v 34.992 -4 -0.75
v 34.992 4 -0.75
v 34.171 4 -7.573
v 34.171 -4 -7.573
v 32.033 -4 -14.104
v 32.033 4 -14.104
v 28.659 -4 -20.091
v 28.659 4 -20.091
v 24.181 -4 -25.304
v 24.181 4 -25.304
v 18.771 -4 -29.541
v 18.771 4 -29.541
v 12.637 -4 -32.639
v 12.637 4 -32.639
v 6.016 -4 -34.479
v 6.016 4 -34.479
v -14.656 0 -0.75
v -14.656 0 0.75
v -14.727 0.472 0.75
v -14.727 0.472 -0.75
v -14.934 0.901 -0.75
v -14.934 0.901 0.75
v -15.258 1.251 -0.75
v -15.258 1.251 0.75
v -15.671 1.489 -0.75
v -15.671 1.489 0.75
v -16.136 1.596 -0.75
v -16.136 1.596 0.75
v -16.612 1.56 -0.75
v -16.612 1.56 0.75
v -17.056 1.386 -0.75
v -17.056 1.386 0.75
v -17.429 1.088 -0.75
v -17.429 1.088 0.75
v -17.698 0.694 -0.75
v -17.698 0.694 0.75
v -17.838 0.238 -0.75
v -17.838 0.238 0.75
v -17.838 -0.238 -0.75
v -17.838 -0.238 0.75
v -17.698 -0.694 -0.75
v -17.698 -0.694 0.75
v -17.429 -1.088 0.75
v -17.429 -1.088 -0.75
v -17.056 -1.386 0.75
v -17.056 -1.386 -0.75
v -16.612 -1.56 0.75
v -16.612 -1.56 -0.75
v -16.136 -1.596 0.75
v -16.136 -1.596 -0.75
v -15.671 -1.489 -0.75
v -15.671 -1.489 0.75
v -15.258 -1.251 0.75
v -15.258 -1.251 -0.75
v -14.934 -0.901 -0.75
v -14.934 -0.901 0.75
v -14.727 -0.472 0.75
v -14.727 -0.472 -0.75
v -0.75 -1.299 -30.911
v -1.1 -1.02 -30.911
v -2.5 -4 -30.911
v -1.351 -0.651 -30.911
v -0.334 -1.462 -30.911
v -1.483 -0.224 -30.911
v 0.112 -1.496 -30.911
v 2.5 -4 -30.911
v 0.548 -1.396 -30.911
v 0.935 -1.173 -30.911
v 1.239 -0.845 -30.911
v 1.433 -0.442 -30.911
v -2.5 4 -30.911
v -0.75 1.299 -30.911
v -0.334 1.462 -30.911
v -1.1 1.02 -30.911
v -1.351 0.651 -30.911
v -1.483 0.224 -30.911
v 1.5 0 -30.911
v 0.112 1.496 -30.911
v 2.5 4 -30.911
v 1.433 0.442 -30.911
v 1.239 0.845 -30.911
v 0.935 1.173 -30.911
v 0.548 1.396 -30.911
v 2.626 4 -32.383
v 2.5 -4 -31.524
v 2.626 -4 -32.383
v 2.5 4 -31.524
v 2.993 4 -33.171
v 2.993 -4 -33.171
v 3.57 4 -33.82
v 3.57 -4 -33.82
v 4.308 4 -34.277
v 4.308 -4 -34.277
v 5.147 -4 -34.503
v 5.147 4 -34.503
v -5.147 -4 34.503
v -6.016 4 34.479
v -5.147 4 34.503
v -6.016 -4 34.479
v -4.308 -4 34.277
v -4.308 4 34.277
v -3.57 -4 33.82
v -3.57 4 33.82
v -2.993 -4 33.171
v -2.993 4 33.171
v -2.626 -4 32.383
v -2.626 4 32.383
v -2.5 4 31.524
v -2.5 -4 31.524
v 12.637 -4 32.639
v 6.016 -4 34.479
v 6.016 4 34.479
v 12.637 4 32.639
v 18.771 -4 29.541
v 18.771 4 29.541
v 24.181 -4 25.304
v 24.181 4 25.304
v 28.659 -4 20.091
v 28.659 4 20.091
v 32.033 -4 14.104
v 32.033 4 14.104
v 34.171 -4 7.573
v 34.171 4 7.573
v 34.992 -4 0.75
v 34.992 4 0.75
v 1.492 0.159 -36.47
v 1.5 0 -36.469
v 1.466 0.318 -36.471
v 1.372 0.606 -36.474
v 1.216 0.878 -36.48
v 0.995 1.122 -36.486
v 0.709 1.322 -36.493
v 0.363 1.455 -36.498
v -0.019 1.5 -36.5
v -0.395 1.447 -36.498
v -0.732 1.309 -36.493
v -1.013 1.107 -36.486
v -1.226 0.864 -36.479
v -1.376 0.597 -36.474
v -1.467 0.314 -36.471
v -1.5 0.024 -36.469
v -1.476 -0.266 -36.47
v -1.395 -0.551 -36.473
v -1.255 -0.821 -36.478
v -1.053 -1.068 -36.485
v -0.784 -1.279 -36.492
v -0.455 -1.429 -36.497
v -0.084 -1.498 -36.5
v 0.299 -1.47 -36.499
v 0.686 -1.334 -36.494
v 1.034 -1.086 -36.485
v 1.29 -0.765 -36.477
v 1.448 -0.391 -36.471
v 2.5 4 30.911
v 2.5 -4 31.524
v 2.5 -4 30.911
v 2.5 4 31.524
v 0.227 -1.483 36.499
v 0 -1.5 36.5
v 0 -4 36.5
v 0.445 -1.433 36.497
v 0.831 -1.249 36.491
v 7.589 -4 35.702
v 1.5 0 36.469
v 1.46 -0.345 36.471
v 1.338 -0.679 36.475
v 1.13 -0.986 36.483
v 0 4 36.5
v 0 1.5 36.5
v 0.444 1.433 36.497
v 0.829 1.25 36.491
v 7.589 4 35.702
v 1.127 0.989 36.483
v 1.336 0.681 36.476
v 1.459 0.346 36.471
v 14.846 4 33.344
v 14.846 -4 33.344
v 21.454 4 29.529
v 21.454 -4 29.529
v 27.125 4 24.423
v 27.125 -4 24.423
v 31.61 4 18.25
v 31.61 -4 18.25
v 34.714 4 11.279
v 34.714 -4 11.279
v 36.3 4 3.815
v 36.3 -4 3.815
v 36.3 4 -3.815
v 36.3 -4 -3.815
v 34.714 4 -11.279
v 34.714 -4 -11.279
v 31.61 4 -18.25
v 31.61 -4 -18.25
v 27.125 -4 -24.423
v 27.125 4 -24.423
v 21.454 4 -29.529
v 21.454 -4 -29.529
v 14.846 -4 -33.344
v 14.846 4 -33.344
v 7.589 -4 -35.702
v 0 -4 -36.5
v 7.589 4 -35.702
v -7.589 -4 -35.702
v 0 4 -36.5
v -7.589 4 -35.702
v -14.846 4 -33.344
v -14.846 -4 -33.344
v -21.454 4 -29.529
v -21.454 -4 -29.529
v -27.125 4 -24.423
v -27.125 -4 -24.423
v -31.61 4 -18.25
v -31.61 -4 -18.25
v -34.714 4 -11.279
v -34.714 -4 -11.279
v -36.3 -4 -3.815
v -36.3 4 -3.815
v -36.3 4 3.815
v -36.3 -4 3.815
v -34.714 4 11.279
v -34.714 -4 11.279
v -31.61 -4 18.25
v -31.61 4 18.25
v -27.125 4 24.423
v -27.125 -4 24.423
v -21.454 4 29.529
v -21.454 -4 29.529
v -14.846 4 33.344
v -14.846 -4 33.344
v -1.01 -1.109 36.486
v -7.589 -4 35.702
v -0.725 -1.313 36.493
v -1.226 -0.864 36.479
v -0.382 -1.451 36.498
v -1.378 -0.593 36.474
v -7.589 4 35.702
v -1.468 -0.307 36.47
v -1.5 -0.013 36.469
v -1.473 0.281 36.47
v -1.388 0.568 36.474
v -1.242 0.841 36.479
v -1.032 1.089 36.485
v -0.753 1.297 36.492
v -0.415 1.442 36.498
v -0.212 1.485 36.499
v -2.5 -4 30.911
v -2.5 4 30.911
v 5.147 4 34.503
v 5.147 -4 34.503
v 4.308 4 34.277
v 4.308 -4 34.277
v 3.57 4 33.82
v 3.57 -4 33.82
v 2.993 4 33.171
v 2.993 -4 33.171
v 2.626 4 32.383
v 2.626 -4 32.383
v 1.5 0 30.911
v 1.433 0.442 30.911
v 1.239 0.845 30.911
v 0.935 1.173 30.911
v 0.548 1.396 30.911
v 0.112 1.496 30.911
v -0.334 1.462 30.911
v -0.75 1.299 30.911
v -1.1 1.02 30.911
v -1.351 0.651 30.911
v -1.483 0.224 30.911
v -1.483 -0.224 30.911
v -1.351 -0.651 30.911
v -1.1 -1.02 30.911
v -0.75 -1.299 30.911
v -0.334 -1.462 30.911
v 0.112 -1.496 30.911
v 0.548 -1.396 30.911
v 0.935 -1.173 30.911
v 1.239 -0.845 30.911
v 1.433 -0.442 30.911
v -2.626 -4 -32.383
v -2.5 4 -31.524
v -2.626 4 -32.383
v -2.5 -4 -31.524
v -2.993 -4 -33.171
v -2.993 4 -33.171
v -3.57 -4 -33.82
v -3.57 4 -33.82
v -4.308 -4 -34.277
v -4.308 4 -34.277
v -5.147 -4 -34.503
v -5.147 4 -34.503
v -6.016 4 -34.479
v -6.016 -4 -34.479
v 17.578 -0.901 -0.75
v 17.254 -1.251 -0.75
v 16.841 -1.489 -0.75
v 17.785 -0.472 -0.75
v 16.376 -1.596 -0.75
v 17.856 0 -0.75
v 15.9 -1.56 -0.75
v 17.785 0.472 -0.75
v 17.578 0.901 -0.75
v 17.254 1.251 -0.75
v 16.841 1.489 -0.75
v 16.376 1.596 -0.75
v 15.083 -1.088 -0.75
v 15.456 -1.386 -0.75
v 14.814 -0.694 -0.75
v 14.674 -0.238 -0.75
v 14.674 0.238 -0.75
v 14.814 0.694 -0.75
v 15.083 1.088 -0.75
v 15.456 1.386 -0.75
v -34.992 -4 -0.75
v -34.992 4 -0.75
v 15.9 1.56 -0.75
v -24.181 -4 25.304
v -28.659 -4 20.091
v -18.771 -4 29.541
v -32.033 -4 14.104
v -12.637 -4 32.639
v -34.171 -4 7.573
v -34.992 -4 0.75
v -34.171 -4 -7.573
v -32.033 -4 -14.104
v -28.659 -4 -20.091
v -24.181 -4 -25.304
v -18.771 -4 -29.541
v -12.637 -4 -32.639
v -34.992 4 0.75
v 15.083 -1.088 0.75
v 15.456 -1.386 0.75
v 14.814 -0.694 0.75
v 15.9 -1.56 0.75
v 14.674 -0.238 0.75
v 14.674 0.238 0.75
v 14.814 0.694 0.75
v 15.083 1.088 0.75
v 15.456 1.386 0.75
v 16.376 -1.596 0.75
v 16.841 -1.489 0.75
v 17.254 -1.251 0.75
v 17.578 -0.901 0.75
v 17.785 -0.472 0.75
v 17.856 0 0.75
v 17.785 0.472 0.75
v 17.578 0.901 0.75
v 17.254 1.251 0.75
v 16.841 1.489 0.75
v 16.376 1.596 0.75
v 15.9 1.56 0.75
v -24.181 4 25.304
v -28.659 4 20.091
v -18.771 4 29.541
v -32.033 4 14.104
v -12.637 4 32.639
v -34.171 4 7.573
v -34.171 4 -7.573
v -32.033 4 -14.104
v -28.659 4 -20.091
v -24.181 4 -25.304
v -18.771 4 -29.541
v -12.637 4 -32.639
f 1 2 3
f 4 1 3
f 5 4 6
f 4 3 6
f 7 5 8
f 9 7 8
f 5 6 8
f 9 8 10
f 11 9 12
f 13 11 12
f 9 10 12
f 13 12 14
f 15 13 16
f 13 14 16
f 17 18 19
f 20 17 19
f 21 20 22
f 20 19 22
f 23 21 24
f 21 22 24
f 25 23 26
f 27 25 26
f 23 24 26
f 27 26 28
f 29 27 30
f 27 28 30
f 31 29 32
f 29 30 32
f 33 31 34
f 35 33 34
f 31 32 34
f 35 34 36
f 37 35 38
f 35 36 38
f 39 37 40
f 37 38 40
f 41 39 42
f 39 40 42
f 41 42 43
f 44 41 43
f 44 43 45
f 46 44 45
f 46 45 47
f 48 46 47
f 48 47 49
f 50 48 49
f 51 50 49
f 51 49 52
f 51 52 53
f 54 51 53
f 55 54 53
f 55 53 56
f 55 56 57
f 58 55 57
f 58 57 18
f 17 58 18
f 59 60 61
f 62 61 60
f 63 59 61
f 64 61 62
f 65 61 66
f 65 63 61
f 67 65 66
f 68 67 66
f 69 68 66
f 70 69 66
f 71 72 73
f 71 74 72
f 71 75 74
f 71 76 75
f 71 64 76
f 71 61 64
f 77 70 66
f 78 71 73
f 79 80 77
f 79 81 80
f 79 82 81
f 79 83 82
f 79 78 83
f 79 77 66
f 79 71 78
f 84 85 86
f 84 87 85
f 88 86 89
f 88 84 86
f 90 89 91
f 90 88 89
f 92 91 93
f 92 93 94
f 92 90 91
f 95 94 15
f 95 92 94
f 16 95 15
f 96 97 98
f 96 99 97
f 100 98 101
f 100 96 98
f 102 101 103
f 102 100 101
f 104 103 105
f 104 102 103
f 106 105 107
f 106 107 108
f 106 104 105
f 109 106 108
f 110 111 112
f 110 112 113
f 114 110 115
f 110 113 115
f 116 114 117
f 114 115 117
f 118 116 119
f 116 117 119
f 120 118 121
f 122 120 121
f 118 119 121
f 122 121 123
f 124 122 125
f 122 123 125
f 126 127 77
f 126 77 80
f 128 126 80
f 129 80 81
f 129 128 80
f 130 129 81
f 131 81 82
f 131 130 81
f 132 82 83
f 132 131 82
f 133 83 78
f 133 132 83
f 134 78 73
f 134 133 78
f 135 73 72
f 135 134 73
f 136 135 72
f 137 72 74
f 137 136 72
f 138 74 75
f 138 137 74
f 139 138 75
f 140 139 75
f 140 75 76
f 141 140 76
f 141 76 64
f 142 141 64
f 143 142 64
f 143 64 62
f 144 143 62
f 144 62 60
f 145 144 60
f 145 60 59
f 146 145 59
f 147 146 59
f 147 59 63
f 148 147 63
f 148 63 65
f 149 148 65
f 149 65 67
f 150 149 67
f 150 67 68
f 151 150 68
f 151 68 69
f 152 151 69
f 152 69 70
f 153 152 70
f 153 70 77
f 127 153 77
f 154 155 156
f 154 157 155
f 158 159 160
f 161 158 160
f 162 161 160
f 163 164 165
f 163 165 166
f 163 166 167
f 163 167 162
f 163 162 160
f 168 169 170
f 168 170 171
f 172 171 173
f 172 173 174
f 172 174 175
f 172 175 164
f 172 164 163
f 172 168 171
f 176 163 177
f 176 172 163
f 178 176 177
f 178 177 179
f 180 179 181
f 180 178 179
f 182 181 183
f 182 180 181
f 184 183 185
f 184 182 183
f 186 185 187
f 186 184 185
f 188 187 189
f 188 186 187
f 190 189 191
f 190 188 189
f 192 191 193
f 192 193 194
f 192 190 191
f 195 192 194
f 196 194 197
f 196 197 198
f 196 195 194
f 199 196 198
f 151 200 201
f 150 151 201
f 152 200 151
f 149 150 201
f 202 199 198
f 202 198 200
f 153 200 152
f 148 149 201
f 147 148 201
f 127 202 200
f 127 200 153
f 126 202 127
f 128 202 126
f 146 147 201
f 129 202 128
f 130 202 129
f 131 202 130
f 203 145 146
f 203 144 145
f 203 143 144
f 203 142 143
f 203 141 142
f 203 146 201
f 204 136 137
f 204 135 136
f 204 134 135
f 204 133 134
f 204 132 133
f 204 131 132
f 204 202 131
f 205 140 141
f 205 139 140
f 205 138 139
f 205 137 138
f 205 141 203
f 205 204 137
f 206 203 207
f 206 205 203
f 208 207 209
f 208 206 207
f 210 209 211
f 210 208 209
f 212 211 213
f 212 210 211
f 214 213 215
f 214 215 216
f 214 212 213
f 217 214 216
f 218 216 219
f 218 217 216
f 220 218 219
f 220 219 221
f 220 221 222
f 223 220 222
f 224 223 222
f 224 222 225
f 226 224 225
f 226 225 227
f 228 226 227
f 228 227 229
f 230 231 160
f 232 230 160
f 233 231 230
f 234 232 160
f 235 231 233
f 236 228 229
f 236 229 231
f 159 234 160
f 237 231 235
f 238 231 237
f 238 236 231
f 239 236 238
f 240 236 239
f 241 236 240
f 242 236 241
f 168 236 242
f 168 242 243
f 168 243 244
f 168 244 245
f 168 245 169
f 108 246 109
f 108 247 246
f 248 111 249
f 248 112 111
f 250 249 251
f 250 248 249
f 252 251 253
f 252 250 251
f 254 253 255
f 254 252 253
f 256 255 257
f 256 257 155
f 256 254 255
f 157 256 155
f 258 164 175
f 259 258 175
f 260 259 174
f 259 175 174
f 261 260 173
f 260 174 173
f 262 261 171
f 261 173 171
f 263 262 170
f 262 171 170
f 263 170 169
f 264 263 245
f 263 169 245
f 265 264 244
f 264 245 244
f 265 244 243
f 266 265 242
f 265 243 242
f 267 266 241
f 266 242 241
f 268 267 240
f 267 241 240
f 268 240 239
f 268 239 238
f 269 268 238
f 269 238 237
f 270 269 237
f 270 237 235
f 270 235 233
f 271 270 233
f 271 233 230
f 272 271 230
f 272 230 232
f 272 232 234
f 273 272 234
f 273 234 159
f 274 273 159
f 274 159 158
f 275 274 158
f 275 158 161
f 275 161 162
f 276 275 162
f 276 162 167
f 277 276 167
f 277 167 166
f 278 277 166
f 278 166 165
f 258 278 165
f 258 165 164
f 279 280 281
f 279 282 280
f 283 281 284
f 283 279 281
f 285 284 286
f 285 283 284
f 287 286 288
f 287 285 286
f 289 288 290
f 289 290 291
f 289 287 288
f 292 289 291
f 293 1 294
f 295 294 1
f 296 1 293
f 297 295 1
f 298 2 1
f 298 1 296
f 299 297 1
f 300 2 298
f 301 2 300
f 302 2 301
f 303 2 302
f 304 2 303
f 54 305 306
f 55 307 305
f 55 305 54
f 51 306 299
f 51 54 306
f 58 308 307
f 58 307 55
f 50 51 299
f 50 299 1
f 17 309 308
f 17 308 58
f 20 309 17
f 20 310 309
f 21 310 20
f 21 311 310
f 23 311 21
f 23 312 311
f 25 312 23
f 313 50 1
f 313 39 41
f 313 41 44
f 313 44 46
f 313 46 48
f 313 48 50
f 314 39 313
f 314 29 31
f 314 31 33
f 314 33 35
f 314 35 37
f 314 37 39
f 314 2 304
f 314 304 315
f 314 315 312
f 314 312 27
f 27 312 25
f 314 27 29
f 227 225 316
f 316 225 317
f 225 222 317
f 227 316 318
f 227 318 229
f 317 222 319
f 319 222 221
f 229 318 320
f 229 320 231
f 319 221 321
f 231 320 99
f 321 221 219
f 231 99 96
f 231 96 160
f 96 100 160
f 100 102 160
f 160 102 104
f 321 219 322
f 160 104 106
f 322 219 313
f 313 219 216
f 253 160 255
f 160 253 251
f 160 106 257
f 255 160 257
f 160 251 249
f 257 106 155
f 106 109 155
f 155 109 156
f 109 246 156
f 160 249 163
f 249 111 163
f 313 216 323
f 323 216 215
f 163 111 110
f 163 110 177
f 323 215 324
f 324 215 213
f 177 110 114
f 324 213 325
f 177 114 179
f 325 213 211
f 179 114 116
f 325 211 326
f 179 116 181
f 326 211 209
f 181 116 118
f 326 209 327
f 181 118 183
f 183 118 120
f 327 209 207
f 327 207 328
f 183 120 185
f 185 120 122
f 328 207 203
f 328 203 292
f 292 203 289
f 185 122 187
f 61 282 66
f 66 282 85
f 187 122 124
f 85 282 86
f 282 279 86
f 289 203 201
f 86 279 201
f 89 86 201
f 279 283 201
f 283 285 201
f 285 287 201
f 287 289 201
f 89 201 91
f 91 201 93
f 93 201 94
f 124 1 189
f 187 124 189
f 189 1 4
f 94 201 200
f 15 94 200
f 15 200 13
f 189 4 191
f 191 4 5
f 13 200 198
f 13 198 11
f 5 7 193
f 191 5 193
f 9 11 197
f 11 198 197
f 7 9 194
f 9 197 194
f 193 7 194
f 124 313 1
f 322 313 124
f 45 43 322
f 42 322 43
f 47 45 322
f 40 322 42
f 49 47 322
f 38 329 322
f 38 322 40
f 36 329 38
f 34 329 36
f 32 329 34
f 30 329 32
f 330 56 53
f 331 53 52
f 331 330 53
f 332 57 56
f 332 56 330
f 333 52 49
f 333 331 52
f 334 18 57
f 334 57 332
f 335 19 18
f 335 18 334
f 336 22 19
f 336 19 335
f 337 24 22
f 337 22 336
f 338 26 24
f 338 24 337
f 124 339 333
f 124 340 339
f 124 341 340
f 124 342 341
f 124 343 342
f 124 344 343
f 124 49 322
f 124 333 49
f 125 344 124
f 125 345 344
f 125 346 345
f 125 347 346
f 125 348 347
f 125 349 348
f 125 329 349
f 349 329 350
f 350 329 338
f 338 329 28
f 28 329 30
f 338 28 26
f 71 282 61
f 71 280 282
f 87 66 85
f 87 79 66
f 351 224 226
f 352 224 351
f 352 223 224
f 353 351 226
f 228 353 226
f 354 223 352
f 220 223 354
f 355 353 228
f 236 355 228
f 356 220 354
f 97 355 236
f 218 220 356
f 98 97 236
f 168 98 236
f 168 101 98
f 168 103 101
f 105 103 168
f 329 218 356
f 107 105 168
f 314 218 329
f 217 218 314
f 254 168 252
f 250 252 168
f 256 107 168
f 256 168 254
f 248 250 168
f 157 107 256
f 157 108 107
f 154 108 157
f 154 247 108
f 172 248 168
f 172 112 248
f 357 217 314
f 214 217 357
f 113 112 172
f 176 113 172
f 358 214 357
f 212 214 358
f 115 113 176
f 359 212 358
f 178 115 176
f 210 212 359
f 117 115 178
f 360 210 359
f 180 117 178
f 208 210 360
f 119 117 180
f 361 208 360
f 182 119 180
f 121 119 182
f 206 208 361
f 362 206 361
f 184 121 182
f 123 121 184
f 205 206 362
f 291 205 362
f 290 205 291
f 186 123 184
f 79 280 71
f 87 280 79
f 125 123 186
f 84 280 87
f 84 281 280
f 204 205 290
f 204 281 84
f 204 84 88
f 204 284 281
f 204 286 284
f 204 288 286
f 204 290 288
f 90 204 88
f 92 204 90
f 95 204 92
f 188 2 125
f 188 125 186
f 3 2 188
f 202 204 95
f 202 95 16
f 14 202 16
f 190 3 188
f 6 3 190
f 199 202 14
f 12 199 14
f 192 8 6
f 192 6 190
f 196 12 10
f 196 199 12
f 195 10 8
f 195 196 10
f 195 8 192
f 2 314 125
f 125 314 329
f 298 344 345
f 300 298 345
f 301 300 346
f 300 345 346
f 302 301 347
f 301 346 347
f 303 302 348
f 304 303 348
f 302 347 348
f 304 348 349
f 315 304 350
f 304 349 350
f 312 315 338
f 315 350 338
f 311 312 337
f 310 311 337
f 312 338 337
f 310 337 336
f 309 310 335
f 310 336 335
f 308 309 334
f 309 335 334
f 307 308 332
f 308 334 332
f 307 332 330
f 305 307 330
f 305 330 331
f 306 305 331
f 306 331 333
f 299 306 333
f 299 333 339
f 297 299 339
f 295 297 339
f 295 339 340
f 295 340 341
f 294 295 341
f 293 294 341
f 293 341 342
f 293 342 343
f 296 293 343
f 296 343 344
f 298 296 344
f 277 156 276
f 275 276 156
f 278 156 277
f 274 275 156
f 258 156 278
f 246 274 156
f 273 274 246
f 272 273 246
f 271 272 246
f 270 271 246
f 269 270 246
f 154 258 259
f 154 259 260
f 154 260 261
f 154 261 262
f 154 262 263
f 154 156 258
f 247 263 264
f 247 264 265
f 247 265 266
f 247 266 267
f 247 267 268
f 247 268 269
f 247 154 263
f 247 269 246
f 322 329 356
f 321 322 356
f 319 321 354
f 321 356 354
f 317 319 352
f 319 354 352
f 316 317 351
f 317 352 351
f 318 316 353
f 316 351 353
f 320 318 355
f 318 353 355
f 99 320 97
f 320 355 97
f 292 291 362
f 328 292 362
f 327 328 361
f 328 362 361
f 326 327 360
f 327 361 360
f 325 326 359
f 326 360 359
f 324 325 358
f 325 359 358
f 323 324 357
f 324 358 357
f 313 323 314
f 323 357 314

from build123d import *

# Parameters (mm, degrees)
ESQUISSE1_R             = 36.5
ESQUISSE1_R_2           = 35
BOSS_EXTRU_1_DEPTH      = 4
ENL_V_MAT_EXTRU_1_REACH = 83.714
ESQUISSE3_R             = 1.5
ENL_V_MAT_EXTRU_2_REACH = 54.305
ESQUISSE2_R             = 1.6
CONG_1_R                = 3


with BuildPart() as part:
    # Esquisse1 → Boss.-Extru.1 (new, symmetric)
    # profile 1 of 7: a face of its own
    with BuildSketch(Plane(origin=(0, 0, 0), x_dir=(1, 0, 0), z_dir=(0, 1, 0))):
        with Locations(Location((0, 0, 0), (0, 0, 270))):
            Circle(ESQUISSE1_R)
        Circle(ESQUISSE1_R_2, mode=Mode.SUBTRACT)
    # profile 2 of 7: a face of its own
    with BuildSketch(Plane(origin=(0, 0, 0), x_dir=(1, 0, 0), z_dir=(0, 1, 0))):
        with BuildLine():
            Line((34.991963363, 0.75), (0, 0.75))
            Line((0, 0.75), (0, -0.75))
            Line((0, -0.75), (34.991963363, -0.75))
            ThreePointArc((34.991963363, -0.75), (34.997990783, -0.375021529), (35, 0))
            ThreePointArc((35, 0), (34.997990783, 0.375021529), (34.991963363, 0.75))
        make_face()
    # profile 3 of 7: a face of its own
    with BuildSketch(Plane(origin=(0, 0, 0), x_dir=(1, 0, 0), z_dir=(0, 1, 0))):
        with BuildLine():
            Line((0, 0.75), (-34.991963363, 0.75))
            ThreePointArc((-34.991963363, 0.75), (-35, 0), (-34.991963363, -0.75))
            Line((-34.991963363, -0.75), (0, -0.75))
            Line((0, -0.75), (0, 0.75))
        make_face()
    # profile 4 of 7: a face of its own
    with BuildSketch(Plane(origin=(0, 0, 0), x_dir=(1, 0, 0), z_dir=(0, 1, 0))):
        with BuildLine():
            Line((0, 0.75), (-34.991963363, 0.75))
            ThreePointArc((-34.991963363, 0.75), (-35, 0), (-34.991963363, -0.75))
            Line((-34.991963363, -0.75), (0, -0.75))
            Line((0, -0.75), (0, 0.75))
        make_face()
    # profile 5 of 7: a face of its own
    with BuildSketch(Plane(origin=(0, 0, 0), x_dir=(1, 0, 0), z_dir=(0, 1, 0))):
        with BuildLine():
            Line((34.991963363, 0.75), (0, 0.75))
            Line((0, 0.75), (0, -0.75))
            Line((0, -0.75), (34.991963363, -0.75))
            ThreePointArc((34.991963363, -0.75), (34.997990783, -0.375021529), (35, 0))
            ThreePointArc((35, 0), (34.997990783, 0.375021529), (34.991963363, 0.75))
        make_face()
    # profile 6 of 7: a face of its own
    with BuildSketch(Plane(origin=(0, 0, 0), x_dir=(1, 0, 0), z_dir=(0, 1, 0))):
        with BuildLine():
            Line((-2.5, -30.910600109), (-2.5, -34.910600109))
            ThreePointArc((-2.5, -34.910600109), (0, -35), (2.5, -34.910600109))
            Line((2.5, -34.910600109), (2.5, -30.910600109))
            Line((2.5, -30.910600109), (-2.5, -30.910600109))
        make_face()
    # profile 7 of 7: a face of its own
    with BuildSketch(Plane(origin=(0, 0, 0), x_dir=(1, 0, 0), z_dir=(0, 1, 0))):
        with BuildLine():
            ThreePointArc((2.5, 34.910600109), (0, 35), (-2.5, 34.910600109))
            Line((-2.5, 34.910600109), (-2.5, 30.910600109))
            Line((-2.5, 30.910600109), (2.5, 30.910600109))
            Line((2.5, 30.910600109), (2.5, 34.910600109))
        make_face()
    extrude(amount=BOSS_EXTRU_1_DEPTH, both=True)

    # Esquisse3 → Enlèv. mat.-Extru.1 (cut, up to next)
    with BuildSketch(Plane.XY.offset(36.5), mode=Mode.PRIVATE) as enl_v_mat_extru_1_sk1:
        Circle(ESQUISSE3_R)
    enl_v_mat_extru_1_tool1 = extrude(enl_v_mat_extru_1_sk1.sketch, amount=-ENL_V_MAT_EXTRU_1_REACH, mode=Mode.PRIVATE) & part.part
    enl_v_mat_extru_1 = enl_v_mat_extru_1_tool1.solids().sort_by_distance((0, 0, 36.5))[0]
    add(enl_v_mat_extru_1, mode=Mode.SUBTRACT)

    # Symétrie1: Enlèv. mat.-Extru.1 across plane
    add(enl_v_mat_extru_1.mirror(Plane.XY), mode=Mode.SUBTRACT)

    # Esquisse2 → Enlèv. mat.-Extru.2 (cut, up to next)
    with BuildSketch(Plane.XY.offset(0.75), mode=Mode.PRIVATE) as enl_v_mat_extru_2_sk1:
        with Locations((-16.256, 0)):
            Circle(ESQUISSE2_R)
    enl_v_mat_extru_2_tool1 = extrude(enl_v_mat_extru_2_sk1.sketch, amount=-ENL_V_MAT_EXTRU_2_REACH, mode=Mode.PRIVATE) & part.part
    # Esquisse2 → Enlèv. mat.-Extru.2 (cut, up to next)
    with BuildSketch(Plane.XY.offset(0.75), mode=Mode.PRIVATE) as enl_v_mat_extru_2_sk2:
        with Locations((16.256, 0)):
            Circle(ESQUISSE2_R)
    enl_v_mat_extru_2_tool2 = extrude(enl_v_mat_extru_2_sk2.sketch, amount=-ENL_V_MAT_EXTRU_2_REACH, mode=Mode.PRIVATE) & part.part
    add(enl_v_mat_extru_2_tool1.solids().sort_by_distance((-16.256, 0, 0.75))[0], mode=Mode.SUBTRACT)
    add(enl_v_mat_extru_2_tool2.solids().sort_by_distance((16.256, 0, 0.75))[0], mode=Mode.SUBTRACT)

    # Congé1
    cong_1_edges = [part.edges().sort_by_distance(p)[0] for p in [
        (2.5, 0, -34.910600109),
        (-2.5, 0, -34.910600109),
        (-2.5, 0, 34.910600109),
        (2.5, 0, 34.910600109),
    ]]
    fillet(cong_1_edges, radius=CONG_1_R)


solid = part.part
